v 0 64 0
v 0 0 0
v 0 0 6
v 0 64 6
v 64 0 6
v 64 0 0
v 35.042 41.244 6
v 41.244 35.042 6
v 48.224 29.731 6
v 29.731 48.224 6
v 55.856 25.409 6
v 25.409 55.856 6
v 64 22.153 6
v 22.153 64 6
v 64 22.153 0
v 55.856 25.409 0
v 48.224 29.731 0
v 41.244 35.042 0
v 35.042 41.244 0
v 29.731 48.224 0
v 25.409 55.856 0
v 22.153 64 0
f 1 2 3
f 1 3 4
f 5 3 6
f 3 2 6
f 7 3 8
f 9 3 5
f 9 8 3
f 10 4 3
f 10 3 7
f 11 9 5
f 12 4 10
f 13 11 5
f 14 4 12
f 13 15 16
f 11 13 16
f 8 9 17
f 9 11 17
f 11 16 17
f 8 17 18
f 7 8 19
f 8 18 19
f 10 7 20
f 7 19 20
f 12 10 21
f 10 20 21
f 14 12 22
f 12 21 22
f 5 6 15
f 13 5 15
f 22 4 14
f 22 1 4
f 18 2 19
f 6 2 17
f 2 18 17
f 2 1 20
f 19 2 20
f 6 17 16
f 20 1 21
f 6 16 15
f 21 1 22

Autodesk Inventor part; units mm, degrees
ref_plane "YZ Plane" through (0, 0, 0) normal (1, 0, 0) x (0, 1, 0)
ref_plane "XZ Plane" through (0, 0, 0) normal (0, 1, 0) x (-1, 0, 0)
ref_plane "XY Plane" through (0, 0, 0) normal (0, 0, 1) x (1, 0, 0)
sketch "Szkic1" plane through (0, 0, 0) normal (0, 0, 1) x (1, 0, 0)
  line L0 (0, 0) -> (64, 0) construction
  line L1 (64, 0) -> (64, 64) construction
  line L2 (64, 64) -> (0, 64) construction
  line L3 (0, 64) -> (0, 0) construction
  line L4 (0, 0) -> (168, 0) construction
  line L5 (168, 0) -> (168, 168) construction
  line L6 (168, 168) -> (0, 168) construction
  line L7 (0, 168) -> (0, 0) construction
  line L8 (84, 168) -> (84, 0) construction
  circle A0 centre (84, 84) radius 65 construction
  line L9 (0, 0) -> (64, 0)
  line L10 (64, 0) -> (64, 22.1534)
  line L11 (0, 0) -> (0, 64)
  line L12 (0, 64) -> (22.1534, 64)
  arc A1 (22.1534, 64) -> (64, 22.1534) centre (84, 84) ccw
  dimension "d7" = 64
  dimension "d8" = 64
  dimension "d9" = 168
  dimension "d10" = 168
  dimension "d11" = 130
  dimension "d12" = 64
  dimension "d13" = 64
extrude "Wyciągnięcie proste1" add sketch "Szkic1" along normal blind 6
equation "\"d7\" = d8"
properties part number "Naroznik_54x54"
